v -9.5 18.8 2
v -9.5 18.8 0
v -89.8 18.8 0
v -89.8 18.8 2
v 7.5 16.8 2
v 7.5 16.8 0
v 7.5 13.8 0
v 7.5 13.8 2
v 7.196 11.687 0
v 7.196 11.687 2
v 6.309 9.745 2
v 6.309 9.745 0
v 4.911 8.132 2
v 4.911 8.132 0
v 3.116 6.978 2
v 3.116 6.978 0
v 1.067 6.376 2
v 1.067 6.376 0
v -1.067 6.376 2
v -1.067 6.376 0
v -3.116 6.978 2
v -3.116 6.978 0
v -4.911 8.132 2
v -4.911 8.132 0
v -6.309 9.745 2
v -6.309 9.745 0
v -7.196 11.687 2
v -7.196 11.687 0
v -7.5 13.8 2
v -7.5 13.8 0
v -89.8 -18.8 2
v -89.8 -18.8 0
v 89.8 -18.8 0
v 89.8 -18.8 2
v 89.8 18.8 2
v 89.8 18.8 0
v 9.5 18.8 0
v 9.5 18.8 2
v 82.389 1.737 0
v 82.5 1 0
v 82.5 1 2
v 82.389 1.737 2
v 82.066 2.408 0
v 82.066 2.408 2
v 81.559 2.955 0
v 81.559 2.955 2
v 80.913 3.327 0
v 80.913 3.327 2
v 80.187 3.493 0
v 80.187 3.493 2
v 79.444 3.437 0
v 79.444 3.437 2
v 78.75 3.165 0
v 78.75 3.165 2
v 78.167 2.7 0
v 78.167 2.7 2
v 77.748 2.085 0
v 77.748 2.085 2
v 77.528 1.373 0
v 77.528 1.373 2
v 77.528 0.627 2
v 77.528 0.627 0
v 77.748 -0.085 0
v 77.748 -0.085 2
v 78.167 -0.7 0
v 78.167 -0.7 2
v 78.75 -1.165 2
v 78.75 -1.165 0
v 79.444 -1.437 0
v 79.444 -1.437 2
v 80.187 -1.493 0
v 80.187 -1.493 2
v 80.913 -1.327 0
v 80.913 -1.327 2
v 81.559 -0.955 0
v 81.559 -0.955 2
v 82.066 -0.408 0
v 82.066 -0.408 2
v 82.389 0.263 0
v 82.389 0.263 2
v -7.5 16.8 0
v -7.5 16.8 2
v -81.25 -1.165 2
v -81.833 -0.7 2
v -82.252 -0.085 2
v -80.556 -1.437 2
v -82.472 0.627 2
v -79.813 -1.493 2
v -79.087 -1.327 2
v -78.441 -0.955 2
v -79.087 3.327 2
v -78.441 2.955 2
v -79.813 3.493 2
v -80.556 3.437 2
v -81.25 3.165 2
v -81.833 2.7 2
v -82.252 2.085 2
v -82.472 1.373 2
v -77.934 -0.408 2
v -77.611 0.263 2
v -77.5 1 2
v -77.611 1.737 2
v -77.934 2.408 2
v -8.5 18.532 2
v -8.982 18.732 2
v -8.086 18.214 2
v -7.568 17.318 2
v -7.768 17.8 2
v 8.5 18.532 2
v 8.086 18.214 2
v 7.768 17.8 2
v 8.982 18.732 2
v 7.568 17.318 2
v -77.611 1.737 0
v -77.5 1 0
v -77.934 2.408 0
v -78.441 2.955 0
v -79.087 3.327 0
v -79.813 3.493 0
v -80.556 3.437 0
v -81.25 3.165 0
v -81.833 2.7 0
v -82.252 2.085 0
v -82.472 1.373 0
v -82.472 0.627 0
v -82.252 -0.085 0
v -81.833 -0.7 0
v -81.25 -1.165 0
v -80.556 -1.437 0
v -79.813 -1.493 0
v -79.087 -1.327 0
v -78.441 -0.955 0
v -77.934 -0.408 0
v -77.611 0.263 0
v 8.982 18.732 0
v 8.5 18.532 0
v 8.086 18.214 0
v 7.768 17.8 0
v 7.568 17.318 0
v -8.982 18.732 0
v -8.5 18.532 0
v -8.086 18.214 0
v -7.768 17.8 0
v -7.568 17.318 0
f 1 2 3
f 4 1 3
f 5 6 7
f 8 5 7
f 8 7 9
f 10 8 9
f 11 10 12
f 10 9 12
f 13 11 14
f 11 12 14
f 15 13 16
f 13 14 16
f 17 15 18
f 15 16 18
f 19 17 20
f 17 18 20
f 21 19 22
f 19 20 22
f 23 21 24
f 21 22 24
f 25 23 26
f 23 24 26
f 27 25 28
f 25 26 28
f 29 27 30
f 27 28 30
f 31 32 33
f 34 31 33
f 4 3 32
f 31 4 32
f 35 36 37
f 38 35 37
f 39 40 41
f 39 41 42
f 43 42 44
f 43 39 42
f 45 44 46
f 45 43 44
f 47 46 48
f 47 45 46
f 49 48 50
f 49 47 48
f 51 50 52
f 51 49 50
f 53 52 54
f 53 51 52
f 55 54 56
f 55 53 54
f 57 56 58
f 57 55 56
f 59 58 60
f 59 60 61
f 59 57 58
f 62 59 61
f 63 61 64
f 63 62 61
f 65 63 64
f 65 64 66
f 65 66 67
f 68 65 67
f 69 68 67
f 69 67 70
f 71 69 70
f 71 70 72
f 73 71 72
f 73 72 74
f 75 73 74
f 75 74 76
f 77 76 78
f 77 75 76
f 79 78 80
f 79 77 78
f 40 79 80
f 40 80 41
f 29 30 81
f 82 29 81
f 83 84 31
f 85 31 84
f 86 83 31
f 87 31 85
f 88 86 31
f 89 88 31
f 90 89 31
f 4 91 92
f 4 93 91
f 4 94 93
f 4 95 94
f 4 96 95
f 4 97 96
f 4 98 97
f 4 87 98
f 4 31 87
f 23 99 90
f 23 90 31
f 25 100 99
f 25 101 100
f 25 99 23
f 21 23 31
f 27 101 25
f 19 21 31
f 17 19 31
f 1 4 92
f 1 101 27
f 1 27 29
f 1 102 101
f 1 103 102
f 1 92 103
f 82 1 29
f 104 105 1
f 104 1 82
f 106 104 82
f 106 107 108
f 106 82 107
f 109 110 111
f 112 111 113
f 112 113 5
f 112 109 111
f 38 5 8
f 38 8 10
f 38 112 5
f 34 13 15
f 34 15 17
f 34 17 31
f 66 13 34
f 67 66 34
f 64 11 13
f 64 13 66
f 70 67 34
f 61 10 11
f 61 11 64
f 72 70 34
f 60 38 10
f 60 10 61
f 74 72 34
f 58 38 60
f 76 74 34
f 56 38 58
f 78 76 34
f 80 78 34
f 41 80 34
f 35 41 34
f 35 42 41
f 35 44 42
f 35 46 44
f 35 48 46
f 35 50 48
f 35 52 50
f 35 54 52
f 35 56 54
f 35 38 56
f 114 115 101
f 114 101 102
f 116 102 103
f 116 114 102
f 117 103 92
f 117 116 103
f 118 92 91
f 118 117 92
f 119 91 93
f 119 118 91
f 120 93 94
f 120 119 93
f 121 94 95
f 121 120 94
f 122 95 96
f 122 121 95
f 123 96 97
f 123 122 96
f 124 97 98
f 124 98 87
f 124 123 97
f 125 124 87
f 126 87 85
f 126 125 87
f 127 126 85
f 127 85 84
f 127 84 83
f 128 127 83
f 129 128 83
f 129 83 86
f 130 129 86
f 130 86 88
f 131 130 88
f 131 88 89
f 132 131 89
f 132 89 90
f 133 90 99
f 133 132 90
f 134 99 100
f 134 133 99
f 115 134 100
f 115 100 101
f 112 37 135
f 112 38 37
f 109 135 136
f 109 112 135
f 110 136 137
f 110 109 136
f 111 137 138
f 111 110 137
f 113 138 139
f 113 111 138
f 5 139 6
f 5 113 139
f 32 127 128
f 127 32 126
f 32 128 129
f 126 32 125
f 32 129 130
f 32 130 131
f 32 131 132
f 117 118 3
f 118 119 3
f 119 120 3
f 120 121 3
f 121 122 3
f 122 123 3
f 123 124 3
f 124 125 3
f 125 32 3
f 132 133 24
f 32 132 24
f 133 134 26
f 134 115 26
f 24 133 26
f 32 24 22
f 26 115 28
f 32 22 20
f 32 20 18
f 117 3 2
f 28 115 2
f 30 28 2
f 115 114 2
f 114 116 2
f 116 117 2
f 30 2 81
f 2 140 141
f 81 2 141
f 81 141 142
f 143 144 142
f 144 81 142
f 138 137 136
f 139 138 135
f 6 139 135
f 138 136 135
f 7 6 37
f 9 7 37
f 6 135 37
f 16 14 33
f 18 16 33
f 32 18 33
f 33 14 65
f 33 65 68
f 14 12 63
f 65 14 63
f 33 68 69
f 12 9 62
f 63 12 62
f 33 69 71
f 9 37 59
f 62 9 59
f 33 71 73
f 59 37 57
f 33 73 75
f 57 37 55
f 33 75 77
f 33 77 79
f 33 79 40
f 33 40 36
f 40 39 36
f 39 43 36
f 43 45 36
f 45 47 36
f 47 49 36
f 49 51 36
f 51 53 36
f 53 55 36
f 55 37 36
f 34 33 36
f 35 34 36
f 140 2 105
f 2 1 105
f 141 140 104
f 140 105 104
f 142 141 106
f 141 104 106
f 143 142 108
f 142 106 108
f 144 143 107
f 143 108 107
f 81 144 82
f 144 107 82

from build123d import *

# Parameters (mm, degrees)
ESQUISSE1_R        = 2.5
BOSS_EXTRU_1_DEPTH = 2
CONG_1_R           = 2


with BuildPart() as part:
    # Esquisse1 → Boss.-Extru.1 (new body)
    with BuildSketch(Plane.XY):
        with BuildLine():
            Line((-89.8, 18.8), (-89.8, -18.8))
            Line((-89.8, -18.8), (89.8, -18.8))
            Line((89.8, -18.8), (89.8, 18.8))
            Line((89.8, 18.8), (7.5, 18.8))
            Line((7.5, 18.8), (7.5, 13.8))
            ThreePointArc((7.5, 13.8), (0, 6.3), (-7.5, 13.8))
            Line((-7.5, 13.8), (-7.5, 18.8))
            Line((-7.5, 18.8), (-89.8, 18.8))
        make_face()
        with Locations((-80, 1)):
            Circle(ESQUISSE1_R, mode=Mode.SUBTRACT)
        with Locations((80, 1)):
            Circle(ESQUISSE1_R, mode=Mode.SUBTRACT)
    extrude(amount=BOSS_EXTRU_1_DEPTH)

    # Congé1
    cong_1_edges = [part.edges().sort_by_distance(p)[0] for p in [
        (7.5, 18.8, 1),
        (-7.5, 18.8, 1),
    ]]
    fillet(cong_1_edges, radius=CONG_1_R)


solid = part.part
